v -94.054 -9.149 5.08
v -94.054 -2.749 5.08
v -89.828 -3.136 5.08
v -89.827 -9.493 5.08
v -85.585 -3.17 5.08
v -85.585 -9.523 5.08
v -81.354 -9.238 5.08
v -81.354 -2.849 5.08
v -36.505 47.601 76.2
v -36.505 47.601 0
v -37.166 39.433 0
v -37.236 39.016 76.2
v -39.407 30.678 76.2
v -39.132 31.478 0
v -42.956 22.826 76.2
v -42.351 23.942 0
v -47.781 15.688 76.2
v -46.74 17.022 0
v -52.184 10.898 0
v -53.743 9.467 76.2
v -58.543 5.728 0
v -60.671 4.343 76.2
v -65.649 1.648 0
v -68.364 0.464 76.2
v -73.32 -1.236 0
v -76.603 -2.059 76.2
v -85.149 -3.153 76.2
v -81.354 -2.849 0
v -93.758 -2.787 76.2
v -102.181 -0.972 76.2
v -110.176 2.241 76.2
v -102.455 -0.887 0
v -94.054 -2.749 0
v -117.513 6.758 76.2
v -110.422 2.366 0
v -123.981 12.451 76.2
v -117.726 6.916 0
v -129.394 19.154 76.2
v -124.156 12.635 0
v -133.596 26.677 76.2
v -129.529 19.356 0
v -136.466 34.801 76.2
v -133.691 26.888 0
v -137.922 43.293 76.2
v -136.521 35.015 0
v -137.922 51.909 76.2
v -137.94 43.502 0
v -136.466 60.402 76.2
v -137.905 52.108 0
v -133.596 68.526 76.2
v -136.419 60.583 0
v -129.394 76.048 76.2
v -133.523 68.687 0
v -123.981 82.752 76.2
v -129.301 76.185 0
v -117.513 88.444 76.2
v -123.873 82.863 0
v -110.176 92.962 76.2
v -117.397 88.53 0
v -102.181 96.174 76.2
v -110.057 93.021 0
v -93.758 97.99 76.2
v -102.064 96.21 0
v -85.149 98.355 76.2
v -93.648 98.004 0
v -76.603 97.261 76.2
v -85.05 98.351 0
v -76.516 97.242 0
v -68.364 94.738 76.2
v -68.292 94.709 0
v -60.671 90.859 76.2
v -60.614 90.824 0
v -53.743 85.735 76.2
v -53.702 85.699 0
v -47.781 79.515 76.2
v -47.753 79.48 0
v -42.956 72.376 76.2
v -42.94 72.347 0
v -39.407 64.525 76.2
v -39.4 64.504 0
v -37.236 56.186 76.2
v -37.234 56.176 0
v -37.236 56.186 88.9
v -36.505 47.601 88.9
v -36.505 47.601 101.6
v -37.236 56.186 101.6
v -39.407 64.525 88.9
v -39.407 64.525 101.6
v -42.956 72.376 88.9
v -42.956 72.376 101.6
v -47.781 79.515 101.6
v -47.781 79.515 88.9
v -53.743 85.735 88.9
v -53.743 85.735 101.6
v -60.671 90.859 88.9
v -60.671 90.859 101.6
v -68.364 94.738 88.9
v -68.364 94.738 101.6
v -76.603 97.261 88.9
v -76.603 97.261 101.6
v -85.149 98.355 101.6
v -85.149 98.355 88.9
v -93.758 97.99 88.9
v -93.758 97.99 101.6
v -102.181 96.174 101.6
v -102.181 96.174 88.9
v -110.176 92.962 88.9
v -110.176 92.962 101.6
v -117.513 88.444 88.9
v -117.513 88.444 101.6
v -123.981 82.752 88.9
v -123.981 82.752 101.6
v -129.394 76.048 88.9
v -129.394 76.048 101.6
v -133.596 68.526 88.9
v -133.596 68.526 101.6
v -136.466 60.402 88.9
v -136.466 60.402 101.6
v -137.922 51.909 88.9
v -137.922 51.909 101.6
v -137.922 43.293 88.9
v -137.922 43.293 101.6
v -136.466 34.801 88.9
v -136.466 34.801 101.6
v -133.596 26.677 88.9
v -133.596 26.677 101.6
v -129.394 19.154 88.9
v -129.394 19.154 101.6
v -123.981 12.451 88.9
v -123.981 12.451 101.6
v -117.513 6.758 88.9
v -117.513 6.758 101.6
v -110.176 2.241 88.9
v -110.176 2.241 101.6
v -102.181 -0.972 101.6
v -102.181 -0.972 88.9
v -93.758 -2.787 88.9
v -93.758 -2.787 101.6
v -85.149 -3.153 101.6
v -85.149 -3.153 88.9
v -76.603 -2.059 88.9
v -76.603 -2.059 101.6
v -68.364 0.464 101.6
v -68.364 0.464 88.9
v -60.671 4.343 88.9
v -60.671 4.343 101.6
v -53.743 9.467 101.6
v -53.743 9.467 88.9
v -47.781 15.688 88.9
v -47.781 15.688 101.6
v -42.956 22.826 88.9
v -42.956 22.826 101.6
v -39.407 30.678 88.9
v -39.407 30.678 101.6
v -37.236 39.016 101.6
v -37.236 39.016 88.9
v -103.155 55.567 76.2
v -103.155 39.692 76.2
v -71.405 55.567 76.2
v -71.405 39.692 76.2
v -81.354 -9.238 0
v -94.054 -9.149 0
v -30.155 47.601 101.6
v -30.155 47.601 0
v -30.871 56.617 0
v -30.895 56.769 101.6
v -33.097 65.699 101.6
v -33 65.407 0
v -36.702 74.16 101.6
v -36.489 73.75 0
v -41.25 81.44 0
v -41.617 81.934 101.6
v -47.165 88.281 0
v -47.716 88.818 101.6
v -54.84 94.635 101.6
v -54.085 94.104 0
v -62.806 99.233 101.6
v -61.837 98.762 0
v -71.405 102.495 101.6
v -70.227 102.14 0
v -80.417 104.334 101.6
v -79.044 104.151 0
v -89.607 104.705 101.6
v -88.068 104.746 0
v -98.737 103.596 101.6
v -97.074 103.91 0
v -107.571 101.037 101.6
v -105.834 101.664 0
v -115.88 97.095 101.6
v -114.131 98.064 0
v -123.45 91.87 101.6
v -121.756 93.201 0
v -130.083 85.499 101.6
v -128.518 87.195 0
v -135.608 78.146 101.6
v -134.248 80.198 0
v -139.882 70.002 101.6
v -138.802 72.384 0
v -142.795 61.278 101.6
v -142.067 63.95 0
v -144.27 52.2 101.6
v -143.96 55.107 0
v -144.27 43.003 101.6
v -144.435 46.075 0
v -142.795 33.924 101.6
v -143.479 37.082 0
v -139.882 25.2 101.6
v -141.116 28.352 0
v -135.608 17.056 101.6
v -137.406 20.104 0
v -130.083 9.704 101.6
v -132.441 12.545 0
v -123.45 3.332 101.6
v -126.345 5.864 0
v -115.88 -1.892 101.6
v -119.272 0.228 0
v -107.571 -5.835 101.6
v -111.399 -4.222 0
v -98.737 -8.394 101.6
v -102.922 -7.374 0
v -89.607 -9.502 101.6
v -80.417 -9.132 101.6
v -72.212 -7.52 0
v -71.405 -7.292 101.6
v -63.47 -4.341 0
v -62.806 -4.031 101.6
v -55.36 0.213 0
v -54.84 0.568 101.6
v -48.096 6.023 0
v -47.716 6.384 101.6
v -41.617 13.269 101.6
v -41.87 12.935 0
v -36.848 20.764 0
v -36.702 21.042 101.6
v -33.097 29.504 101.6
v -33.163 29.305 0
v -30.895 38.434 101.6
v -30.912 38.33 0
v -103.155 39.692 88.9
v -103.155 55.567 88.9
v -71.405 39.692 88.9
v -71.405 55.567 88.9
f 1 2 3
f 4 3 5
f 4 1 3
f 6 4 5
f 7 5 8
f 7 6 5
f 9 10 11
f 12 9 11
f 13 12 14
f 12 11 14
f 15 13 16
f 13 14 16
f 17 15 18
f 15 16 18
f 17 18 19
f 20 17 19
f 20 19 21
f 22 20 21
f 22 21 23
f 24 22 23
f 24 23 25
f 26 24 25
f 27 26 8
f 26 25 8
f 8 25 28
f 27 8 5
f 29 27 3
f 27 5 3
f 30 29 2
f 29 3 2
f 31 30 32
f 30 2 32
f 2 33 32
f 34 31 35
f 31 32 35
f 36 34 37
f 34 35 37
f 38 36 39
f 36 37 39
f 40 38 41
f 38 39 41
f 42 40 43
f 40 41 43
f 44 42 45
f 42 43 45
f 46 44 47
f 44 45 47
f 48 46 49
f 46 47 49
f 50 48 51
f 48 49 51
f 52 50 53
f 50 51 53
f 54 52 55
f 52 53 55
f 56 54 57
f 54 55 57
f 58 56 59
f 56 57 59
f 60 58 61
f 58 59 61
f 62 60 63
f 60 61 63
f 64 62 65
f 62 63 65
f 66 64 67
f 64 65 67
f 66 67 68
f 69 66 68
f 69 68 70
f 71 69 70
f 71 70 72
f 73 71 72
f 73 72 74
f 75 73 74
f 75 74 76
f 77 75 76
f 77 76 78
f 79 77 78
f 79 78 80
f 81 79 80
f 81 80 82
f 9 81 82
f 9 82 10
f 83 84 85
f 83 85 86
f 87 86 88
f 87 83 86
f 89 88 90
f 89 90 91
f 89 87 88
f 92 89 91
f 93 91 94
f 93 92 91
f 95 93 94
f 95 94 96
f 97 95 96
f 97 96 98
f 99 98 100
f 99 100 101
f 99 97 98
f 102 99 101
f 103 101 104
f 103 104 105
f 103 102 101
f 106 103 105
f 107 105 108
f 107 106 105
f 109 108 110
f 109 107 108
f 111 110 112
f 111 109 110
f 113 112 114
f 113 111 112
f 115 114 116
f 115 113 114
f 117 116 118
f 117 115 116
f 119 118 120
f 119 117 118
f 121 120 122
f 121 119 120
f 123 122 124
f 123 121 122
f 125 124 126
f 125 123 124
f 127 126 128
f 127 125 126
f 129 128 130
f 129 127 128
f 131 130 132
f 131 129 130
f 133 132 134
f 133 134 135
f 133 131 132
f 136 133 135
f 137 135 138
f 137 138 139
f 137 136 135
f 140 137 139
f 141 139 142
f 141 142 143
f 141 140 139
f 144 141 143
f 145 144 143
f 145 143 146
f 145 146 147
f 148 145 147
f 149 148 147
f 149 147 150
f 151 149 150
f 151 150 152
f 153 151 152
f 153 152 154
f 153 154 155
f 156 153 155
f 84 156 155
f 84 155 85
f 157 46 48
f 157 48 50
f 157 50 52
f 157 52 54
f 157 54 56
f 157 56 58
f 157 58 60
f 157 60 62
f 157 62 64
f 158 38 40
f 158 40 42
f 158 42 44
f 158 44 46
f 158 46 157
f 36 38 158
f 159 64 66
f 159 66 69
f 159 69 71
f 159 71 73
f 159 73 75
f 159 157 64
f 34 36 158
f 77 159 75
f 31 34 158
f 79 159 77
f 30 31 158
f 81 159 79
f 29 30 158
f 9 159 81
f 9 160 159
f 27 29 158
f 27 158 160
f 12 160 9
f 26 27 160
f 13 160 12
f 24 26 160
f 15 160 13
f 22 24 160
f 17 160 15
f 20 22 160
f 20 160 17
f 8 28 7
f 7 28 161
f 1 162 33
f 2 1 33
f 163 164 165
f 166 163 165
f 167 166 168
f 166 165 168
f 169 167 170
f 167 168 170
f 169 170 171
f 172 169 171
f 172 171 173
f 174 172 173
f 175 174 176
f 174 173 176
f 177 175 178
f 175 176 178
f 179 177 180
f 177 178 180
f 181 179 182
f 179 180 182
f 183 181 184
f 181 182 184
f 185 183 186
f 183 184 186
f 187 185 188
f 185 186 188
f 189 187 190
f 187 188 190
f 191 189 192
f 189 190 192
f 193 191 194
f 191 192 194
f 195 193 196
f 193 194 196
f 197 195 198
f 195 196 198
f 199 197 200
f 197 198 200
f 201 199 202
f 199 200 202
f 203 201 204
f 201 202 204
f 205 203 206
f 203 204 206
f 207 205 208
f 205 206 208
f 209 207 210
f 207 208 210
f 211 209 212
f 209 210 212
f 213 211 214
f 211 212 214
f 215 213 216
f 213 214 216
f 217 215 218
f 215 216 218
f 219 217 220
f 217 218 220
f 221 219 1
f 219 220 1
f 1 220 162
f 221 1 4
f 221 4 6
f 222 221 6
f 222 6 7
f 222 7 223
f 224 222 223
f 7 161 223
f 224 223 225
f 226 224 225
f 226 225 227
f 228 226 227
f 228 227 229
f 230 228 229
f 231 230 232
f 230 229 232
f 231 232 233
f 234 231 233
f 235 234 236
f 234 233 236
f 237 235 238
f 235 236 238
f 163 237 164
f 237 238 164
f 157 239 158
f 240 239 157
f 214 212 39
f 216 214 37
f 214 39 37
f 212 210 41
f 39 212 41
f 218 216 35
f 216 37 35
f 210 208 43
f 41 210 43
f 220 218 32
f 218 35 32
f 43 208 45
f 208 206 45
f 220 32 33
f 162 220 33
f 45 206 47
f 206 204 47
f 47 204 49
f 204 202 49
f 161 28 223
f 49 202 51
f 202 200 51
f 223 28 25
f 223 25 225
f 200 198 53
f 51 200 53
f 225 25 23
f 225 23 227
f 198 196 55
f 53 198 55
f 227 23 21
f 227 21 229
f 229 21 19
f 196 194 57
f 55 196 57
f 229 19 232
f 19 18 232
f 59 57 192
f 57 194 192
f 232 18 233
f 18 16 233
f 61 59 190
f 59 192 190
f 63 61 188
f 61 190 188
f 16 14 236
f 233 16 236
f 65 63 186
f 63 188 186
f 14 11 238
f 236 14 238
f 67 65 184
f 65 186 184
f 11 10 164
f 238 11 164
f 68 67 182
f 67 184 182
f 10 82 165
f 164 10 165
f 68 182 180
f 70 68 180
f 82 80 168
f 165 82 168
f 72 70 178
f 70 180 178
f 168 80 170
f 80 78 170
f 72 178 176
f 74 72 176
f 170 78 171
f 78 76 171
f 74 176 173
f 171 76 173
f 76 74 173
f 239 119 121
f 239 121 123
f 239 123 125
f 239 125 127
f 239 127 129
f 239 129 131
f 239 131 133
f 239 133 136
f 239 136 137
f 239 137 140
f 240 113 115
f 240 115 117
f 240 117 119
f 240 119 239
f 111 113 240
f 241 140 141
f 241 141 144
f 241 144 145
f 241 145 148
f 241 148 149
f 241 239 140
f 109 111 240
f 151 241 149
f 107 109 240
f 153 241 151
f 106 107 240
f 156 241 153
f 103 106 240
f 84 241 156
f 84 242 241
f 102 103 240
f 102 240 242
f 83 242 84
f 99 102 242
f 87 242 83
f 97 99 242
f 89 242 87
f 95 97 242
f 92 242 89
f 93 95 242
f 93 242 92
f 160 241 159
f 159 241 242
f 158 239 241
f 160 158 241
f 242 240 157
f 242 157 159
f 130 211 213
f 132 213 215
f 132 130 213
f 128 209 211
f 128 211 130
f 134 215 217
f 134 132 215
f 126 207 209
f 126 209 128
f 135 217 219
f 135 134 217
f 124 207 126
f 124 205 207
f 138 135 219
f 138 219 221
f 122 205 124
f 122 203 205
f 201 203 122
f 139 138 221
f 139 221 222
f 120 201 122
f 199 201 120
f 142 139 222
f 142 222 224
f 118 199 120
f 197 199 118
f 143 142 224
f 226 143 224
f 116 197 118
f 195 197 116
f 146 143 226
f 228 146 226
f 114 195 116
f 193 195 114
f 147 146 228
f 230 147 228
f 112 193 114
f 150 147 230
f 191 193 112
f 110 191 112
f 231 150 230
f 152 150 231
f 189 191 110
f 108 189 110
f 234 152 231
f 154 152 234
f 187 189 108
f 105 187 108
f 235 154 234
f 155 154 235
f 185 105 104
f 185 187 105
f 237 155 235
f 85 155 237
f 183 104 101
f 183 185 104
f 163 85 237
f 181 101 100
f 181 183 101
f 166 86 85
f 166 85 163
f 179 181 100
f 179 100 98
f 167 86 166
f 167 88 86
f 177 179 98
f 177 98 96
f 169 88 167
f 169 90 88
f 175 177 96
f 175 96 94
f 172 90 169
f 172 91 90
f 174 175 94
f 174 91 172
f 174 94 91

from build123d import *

# Parameters (mm, degrees)
F0_R     = 57.15
F1_DEPTH = 88.9
F2_R     = 50.8
F3_DEPTH = 76.2
F4_W     = 31.75
F4_H     = 15.875
F5_DEPTH = 12.7
F6_R     = 57.15
F6_R_2   = 50.8
F7_DEPTH = 12.7
F9_DEPTH = 5.08


with BuildPart() as f1:
    # F0 (on Top) → F1 (new body)
    with BuildSketch(Plane.XY):
        with Locations((-87.3053744435, 47.6011708379)):
            Circle(F0_R)
    extrude(amount=F1_DEPTH)

    # F2 (on face) → F3 (cut)
    with BuildSketch(Plane(origin=(0, 0, 0), x_dir=(1, 0, 0), z_dir=(0, 0, -1))):
        with Locations((-87.3053744435, -47.6011708379)):
            Circle(F2_R)
    extrude(amount=-F3_DEPTH, mode=Mode.SUBTRACT)

    # F4 (on face) → F5 (cut)
    with BuildSketch(Plane.XY.offset(88.9)):
        with Locations((-87.2800468532, 47.6297885038)):
            Rectangle(F4_W, F4_H)
    extrude(amount=-F5_DEPTH, mode=Mode.SUBTRACT)

    # F6 (on face) → F7 (join)
    with BuildSketch(Plane.XY.offset(88.9)):
        with Locations((-87.3053744435, 47.6011708379)):
            Circle(F6_R)
        with Locations((-87.3053744435, 47.6011708379)):
            Circle(F6_R_2, mode=Mode.SUBTRACT)
    extrude(amount=F7_DEPTH)

    # F8 (on face) → F9 (cut)
    with BuildSketch(Plane(origin=(0, 0, 0), x_dir=(1, 0, 0), z_dir=(0, 0, -1))):
        with BuildLine():
            ThreePointArc((-81.3538346767, 9.2380908956), (-87.7063174424, 9.5474227118), (-94.0538346767, 9.1489902586))
            Line((-94.0538346767, 9.1489902586), (-94.0538346767, 2.7485886897))
            ThreePointArc((-94.0538346767, 2.7485886897), (-87.7069848083, 3.1972416286), (-81.3538346767, 2.8489944186))
            Line((-81.3538346767, 2.8489944186), (-81.3538346767, 9.2380908956))
        make_face()
        with BuildLine():
            ThreePointArc((-81.3538346767, 2.8489944186), (-87.7069848083, 3.1972416286), (-94.0538346767, 2.7485886897))
            Line((-94.0538346767, 2.7485886897), (-94.0538346767, 0))
            Line((-94.0538346767, 0), (-81.3538346767, 0))
            Line((-81.3538346767, 0), (-81.3538346767, 2.8489944186))
        make_face()
    extrude(amount=-F9_DEPTH, mode=Mode.SUBTRACT)


solid = f1.part
